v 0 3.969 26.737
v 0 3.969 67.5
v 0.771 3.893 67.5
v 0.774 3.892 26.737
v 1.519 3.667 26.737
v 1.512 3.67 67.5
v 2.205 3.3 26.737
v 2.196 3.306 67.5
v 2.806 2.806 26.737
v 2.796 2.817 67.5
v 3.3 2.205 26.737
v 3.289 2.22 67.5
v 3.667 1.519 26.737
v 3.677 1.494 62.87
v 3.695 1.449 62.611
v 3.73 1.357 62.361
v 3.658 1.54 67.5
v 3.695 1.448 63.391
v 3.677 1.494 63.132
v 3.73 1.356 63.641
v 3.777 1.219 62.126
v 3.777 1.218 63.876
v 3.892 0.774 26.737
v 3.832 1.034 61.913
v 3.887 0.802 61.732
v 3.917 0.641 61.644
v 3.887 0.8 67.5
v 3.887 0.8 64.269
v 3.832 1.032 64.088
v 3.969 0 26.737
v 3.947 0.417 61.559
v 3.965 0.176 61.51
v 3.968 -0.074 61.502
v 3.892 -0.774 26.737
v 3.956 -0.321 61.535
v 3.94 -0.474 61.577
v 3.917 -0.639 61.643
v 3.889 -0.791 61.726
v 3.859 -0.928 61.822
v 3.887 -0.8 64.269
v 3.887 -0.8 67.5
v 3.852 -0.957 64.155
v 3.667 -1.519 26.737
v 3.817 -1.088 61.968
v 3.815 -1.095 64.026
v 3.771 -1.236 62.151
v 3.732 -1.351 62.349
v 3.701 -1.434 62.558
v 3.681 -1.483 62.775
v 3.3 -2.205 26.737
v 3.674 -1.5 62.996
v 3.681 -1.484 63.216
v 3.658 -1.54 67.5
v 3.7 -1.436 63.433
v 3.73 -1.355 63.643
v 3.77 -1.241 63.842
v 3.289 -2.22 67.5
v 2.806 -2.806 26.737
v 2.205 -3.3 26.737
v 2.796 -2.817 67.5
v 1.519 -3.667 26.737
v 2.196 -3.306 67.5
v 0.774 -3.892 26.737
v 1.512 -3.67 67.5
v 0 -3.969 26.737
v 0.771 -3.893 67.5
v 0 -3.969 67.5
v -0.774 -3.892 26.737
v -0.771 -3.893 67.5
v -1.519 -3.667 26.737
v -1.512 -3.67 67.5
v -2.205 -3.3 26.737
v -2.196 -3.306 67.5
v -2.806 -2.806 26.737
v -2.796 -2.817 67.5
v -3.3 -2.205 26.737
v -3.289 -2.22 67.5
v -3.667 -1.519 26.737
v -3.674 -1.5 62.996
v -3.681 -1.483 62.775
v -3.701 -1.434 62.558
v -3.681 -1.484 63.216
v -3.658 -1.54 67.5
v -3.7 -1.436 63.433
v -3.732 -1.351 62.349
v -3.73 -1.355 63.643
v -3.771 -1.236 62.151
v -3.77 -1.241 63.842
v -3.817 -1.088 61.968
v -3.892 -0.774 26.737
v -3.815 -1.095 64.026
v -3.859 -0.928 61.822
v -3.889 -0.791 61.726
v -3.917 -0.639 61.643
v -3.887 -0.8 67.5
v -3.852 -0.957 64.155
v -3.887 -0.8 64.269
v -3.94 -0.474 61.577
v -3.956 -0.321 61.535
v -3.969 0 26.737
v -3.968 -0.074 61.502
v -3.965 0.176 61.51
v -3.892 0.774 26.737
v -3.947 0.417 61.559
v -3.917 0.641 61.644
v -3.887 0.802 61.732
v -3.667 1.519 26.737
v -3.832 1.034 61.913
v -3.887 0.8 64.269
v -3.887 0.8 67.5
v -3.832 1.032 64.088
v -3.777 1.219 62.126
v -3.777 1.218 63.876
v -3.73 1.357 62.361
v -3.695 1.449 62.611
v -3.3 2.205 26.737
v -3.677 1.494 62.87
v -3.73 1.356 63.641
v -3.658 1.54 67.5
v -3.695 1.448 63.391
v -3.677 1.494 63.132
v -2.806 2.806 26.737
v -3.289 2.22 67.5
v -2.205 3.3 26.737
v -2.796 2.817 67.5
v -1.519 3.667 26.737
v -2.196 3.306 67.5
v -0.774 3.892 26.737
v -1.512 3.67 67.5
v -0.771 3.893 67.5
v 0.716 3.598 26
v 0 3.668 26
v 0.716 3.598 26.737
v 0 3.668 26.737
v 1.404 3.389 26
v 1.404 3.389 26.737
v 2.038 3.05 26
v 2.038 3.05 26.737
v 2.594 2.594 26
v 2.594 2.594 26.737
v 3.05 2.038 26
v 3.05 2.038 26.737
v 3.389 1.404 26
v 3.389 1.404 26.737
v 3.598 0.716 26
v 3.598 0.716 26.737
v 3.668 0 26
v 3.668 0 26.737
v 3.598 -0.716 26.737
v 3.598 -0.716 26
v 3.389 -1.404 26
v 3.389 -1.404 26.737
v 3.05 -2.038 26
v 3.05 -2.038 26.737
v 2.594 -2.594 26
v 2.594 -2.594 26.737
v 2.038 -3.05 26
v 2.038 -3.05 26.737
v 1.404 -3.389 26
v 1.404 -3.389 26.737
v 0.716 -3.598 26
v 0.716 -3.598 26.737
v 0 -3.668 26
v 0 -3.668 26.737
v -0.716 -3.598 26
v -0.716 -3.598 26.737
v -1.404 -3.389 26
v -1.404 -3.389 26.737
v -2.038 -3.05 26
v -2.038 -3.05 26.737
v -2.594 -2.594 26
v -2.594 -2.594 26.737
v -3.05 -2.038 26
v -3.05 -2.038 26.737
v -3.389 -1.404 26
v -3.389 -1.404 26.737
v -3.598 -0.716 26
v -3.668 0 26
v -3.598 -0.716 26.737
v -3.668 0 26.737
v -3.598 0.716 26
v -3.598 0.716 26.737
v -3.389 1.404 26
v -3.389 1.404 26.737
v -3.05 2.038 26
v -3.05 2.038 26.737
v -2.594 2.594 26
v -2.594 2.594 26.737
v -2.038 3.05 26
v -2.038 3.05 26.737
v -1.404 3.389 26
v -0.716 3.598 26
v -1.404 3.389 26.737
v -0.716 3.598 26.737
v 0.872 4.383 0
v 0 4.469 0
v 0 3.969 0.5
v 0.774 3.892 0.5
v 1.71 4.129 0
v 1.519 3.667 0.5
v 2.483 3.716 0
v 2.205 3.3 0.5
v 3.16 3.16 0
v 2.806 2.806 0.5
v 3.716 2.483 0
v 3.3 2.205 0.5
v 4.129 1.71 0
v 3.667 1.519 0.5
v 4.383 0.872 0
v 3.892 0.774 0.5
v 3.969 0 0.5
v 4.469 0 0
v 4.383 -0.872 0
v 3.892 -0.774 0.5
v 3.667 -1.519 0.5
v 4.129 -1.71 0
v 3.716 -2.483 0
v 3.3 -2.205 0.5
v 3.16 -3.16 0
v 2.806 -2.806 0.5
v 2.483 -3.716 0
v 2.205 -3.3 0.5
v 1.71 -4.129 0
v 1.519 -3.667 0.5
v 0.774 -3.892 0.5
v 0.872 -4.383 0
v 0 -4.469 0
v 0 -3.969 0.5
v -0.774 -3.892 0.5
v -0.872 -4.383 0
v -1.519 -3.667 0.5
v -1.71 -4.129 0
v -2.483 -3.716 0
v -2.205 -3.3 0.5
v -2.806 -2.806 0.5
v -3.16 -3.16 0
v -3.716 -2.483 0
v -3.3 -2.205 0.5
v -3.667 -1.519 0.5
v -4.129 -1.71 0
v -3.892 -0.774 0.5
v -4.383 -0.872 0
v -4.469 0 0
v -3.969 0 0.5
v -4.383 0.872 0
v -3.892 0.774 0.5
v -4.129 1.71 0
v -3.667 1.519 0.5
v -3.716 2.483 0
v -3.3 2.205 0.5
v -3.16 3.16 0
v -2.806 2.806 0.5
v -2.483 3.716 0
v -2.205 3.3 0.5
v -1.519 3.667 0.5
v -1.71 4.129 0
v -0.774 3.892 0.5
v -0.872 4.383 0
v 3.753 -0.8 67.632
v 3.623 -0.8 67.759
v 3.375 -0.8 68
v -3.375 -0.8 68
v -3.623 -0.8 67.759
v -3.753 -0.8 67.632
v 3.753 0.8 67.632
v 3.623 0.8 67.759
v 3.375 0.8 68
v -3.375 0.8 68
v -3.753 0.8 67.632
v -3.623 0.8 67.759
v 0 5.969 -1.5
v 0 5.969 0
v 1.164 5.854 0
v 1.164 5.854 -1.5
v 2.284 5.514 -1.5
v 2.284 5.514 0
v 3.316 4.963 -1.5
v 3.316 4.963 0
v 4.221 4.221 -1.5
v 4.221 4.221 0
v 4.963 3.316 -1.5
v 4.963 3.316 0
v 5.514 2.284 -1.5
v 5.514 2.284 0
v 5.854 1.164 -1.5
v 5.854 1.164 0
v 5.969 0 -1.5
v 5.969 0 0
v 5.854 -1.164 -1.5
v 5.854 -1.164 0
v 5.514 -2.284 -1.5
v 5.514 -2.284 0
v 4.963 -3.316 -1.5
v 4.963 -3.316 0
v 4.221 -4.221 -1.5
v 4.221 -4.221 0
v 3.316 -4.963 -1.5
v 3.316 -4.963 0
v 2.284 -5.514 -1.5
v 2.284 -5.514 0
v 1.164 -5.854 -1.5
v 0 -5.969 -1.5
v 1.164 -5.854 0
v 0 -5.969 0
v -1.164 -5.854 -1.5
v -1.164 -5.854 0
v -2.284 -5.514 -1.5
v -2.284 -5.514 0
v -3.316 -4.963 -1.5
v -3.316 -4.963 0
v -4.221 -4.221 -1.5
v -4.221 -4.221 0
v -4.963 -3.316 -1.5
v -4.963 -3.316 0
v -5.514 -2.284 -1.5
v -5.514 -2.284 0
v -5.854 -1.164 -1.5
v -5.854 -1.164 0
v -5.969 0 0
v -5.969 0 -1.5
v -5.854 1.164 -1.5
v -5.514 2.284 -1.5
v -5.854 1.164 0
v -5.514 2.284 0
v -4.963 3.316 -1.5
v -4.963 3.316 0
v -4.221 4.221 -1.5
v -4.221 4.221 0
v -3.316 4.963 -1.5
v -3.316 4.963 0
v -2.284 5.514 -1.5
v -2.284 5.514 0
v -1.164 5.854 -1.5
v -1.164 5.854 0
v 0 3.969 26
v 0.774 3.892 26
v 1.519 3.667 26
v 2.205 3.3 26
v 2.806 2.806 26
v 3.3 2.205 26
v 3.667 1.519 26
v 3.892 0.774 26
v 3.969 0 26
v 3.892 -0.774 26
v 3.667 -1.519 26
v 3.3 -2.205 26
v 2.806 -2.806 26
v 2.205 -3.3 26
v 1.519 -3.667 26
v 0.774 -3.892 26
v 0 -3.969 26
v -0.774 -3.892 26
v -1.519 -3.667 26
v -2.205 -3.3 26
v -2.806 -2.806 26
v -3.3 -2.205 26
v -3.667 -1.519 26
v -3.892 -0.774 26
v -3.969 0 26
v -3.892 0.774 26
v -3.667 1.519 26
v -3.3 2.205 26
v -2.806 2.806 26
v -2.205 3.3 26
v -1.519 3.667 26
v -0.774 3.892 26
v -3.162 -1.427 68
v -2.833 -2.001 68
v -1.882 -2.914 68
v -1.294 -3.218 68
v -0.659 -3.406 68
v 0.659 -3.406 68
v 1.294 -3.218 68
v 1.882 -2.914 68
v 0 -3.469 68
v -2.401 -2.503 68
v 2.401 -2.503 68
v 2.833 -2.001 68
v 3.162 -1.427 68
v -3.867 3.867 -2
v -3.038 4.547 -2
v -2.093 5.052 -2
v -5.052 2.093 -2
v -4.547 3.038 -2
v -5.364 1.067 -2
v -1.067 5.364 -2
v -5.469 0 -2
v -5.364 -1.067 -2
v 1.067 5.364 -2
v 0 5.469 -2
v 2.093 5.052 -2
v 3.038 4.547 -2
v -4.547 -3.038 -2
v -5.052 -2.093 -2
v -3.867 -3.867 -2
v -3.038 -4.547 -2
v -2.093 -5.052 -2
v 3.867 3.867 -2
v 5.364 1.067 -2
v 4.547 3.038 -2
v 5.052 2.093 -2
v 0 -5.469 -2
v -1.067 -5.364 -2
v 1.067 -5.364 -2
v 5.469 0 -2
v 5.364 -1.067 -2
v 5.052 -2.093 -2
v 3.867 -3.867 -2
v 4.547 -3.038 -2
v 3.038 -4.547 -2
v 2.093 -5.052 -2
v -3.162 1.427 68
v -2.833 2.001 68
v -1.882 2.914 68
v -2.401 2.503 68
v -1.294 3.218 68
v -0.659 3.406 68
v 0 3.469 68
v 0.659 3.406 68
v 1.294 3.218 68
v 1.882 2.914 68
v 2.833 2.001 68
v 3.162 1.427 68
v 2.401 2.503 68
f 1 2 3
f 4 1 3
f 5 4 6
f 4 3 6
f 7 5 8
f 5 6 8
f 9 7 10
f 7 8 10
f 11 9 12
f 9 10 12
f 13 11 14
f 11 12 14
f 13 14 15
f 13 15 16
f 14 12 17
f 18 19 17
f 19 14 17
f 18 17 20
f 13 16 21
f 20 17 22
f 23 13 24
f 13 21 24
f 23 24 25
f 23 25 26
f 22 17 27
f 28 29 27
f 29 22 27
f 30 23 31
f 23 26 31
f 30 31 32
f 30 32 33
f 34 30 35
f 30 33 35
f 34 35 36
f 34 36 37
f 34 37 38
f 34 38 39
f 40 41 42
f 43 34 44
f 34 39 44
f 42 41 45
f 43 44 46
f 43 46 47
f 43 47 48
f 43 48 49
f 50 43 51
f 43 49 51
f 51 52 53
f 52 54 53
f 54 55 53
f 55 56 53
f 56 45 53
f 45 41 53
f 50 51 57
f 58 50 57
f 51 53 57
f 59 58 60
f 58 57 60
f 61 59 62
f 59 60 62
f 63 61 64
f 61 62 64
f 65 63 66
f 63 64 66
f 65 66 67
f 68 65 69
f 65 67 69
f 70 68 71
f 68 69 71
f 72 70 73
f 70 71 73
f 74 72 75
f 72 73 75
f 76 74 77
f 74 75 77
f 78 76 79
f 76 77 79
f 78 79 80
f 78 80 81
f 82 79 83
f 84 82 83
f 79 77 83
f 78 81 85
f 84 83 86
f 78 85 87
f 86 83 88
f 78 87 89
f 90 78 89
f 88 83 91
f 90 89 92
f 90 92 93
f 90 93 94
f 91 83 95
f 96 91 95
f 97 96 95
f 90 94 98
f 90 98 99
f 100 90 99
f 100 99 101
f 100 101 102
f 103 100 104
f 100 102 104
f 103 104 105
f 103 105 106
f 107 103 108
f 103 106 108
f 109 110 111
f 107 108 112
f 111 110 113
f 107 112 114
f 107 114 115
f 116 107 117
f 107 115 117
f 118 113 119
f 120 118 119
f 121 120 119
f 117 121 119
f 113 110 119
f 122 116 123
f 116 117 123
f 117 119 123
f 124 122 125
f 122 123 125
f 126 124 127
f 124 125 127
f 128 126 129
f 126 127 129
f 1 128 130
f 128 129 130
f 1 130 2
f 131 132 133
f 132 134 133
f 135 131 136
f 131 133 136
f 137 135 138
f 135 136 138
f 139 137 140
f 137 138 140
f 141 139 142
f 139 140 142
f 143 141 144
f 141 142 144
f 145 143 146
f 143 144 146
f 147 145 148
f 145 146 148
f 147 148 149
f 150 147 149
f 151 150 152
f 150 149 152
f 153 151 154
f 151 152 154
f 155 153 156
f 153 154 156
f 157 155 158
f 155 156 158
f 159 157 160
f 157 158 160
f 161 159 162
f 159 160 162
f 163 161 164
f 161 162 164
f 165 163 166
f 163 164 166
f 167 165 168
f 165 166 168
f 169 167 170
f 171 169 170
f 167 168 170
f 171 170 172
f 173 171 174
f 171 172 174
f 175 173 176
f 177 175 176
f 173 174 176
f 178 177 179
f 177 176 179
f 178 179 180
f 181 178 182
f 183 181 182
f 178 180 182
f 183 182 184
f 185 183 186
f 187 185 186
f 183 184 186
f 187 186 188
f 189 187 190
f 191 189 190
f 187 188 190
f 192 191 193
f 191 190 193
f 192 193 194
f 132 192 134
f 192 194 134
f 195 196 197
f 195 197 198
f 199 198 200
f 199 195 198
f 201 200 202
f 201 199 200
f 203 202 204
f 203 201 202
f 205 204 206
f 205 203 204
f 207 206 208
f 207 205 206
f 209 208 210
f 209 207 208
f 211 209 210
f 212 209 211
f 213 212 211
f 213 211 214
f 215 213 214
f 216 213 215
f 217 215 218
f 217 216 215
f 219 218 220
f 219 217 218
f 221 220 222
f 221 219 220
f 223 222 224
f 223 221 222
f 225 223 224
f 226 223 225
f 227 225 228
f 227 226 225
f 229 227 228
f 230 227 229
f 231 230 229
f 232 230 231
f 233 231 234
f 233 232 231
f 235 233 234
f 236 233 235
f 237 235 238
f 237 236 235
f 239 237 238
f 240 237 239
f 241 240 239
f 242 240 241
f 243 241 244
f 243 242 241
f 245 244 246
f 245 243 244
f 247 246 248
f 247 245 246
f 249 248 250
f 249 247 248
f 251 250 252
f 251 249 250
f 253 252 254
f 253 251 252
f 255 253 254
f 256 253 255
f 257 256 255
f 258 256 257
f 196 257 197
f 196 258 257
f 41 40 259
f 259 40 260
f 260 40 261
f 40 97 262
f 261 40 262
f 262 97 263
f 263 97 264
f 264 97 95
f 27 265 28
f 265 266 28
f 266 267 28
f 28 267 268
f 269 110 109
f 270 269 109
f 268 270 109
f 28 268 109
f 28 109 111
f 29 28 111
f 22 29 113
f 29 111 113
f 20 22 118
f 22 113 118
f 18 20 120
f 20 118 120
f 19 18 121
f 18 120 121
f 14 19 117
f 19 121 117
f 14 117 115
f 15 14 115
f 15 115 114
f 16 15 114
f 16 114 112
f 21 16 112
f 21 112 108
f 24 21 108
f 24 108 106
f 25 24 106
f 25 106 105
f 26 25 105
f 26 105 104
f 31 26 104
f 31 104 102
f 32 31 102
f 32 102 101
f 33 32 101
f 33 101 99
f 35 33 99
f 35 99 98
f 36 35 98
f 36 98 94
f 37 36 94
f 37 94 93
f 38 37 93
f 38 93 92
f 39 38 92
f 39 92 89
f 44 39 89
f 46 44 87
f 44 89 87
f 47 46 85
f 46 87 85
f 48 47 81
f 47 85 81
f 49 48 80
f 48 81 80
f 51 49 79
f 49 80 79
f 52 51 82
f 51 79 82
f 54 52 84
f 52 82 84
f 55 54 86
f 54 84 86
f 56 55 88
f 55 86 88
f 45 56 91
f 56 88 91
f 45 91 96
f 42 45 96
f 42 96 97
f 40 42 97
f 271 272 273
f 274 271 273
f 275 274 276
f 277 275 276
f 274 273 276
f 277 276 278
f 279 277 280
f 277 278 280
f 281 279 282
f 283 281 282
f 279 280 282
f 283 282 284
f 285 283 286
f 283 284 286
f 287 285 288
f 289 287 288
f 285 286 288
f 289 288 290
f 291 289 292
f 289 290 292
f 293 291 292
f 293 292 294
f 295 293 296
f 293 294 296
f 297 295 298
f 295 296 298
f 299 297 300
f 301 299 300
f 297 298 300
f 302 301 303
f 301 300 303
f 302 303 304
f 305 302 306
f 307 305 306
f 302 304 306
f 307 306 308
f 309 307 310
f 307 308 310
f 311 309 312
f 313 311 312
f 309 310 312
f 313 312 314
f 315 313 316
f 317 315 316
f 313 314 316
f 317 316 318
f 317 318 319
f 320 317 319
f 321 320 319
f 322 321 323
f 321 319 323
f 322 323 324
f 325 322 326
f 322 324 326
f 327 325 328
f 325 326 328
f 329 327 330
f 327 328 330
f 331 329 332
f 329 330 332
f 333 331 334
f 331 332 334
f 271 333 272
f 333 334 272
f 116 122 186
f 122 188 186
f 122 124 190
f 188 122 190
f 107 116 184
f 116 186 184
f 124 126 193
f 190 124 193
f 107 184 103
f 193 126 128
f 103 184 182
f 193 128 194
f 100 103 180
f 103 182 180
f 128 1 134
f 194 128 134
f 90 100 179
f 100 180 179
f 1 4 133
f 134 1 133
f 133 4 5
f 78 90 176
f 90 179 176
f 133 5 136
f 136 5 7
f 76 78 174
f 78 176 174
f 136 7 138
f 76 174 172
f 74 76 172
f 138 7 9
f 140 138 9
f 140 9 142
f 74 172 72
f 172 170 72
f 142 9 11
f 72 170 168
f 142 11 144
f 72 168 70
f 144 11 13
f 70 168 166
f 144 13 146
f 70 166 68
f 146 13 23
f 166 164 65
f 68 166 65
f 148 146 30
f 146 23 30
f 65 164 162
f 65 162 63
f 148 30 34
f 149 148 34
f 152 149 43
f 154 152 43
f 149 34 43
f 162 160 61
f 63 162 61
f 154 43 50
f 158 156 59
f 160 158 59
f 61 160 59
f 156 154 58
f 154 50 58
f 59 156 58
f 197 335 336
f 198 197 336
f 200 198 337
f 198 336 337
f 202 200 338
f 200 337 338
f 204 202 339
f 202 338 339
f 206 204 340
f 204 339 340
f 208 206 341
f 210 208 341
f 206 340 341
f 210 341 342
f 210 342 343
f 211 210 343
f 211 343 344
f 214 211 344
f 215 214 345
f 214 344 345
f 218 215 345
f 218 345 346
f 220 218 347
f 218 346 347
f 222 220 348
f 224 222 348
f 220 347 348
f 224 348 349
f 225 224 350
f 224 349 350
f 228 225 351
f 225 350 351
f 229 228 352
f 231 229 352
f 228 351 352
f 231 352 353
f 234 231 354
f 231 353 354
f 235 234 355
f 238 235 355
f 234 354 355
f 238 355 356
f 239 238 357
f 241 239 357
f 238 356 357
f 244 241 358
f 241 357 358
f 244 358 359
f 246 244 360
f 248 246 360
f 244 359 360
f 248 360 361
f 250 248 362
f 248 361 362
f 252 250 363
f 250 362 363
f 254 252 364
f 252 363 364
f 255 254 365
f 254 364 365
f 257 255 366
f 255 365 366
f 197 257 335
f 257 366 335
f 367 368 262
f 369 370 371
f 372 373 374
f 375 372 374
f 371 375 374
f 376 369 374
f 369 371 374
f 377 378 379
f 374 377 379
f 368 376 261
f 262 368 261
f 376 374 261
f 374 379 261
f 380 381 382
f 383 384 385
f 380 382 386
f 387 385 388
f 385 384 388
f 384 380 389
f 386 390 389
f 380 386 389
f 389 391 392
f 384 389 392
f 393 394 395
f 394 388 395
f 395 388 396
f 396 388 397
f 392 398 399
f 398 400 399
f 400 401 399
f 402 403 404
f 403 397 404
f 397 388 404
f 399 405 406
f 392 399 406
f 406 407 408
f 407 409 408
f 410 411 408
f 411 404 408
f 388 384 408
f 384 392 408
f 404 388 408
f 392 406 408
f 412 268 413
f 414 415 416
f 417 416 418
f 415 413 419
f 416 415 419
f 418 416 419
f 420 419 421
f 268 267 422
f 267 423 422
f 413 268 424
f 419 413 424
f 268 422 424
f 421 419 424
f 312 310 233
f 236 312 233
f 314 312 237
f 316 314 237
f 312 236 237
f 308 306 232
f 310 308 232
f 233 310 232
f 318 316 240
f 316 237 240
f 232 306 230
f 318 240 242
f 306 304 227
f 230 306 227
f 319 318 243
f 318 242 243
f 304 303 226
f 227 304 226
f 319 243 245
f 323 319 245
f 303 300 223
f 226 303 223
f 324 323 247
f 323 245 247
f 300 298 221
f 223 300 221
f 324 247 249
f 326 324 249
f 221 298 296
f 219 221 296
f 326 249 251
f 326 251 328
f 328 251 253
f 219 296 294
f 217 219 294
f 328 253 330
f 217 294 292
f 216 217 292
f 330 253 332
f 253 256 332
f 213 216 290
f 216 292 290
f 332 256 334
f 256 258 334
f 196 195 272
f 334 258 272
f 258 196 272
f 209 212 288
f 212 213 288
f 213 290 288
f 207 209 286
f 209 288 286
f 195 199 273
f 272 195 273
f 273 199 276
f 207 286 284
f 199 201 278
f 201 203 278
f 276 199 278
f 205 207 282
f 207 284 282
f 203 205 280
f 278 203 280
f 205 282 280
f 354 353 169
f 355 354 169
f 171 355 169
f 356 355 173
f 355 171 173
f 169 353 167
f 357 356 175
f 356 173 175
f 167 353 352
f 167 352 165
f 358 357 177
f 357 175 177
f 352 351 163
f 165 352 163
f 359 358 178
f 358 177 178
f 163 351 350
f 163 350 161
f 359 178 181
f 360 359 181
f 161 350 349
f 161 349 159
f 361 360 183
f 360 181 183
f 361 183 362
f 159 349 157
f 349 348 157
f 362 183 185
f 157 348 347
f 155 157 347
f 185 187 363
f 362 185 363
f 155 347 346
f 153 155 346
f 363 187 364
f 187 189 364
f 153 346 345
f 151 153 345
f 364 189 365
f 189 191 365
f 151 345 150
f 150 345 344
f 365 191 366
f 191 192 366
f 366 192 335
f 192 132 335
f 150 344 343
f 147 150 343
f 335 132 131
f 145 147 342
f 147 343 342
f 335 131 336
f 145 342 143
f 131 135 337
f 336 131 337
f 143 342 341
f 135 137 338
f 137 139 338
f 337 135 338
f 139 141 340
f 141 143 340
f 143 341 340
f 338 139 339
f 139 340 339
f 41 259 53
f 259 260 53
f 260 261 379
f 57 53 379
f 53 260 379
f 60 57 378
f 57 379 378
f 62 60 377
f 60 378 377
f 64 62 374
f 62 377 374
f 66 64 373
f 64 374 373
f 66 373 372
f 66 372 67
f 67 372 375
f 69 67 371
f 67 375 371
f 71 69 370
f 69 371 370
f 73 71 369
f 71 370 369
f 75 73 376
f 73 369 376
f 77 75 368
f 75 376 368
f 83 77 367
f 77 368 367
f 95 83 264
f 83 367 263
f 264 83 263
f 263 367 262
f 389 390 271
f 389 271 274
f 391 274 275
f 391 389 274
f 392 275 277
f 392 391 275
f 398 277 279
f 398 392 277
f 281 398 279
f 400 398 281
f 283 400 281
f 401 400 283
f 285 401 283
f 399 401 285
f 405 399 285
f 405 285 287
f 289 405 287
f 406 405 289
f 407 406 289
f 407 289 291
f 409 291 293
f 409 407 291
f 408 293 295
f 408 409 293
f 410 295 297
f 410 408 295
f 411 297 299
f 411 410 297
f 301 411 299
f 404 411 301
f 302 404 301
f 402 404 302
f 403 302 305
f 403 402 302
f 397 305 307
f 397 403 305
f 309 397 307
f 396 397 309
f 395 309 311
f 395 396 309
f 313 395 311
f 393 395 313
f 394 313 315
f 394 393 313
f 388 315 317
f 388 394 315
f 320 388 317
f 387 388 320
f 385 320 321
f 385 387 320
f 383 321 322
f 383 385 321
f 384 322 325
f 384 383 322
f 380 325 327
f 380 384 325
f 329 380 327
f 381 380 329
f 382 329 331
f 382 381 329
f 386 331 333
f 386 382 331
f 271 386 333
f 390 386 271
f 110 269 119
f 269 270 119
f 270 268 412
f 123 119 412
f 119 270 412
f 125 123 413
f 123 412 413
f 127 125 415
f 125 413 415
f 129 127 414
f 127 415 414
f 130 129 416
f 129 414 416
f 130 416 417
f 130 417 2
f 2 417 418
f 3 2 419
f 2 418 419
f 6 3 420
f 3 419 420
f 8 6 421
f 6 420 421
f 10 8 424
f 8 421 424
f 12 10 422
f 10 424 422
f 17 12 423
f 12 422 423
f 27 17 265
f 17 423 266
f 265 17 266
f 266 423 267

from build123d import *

# Parameters (mm, degrees)
EXTRUDE1_DEPTH      = 6.96875
EXTRUDE1_DEPTH_BACK = 6.96875
CHAMFER1_SIZE       = 0.5


with BuildPart() as part:
    # Sketch1 → Revolve1 (revolve)
    with BuildSketch(Plane(origin=(0, 0, 0), x_dir=(0, 0, -1), z_dir=(1, 0, 0))):
        Polygon((0, 3.96875), (-26, 3.96875), (-26, 3.9375), (-26, 3.668), (-26.7366, 3.668), (-26.7366, 3.96875), (-68, 3.96875), (-68, 0), (2, 0), (2, 5.96875), (0, 5.96875), align=None)
    revolve(axis=Axis((0, 0, 100.107110912), (0, 0, -1)))

    # Sketch2 → Extrude1 (cut, two sides)
    with BuildSketch(Plane(origin=(0, 0, 0), x_dir=(0, 0, -1), z_dir=(1, 0, 0))) as extrude1_sk:
        with BuildLine():
            Line((-69.561526288, 0.8), (-64.268857754, 0.8))
            ThreePointArc((-64.268857754, 0.8), (-61.5, 0), (-64.268857754, -0.8))
            Line((-64.268857754, -0.8), (-69.561526288, -0.8))
            Line((-69.561526288, -0.8), (-69.561526288, 0.8))
        make_face()
    extrude(amount=EXTRUDE1_DEPTH, mode=Mode.SUBTRACT)
    extrude(extrude1_sk.sketch, amount=-EXTRUDE1_DEPTH_BACK, mode=Mode.SUBTRACT)

    # Chamfer1
    chamfer1_edges = [part.edges().sort_by_distance(p)[0] for p in [
        (2.507586146, 3.076197049, 68),
        (0, -5.96875, -2),
        (0, -3.96875, 68),
        (0, -3.96875, 0),
    ]]
    chamfer(chamfer1_edges, length=CHAMFER1_SIZE)


solid = part.part
